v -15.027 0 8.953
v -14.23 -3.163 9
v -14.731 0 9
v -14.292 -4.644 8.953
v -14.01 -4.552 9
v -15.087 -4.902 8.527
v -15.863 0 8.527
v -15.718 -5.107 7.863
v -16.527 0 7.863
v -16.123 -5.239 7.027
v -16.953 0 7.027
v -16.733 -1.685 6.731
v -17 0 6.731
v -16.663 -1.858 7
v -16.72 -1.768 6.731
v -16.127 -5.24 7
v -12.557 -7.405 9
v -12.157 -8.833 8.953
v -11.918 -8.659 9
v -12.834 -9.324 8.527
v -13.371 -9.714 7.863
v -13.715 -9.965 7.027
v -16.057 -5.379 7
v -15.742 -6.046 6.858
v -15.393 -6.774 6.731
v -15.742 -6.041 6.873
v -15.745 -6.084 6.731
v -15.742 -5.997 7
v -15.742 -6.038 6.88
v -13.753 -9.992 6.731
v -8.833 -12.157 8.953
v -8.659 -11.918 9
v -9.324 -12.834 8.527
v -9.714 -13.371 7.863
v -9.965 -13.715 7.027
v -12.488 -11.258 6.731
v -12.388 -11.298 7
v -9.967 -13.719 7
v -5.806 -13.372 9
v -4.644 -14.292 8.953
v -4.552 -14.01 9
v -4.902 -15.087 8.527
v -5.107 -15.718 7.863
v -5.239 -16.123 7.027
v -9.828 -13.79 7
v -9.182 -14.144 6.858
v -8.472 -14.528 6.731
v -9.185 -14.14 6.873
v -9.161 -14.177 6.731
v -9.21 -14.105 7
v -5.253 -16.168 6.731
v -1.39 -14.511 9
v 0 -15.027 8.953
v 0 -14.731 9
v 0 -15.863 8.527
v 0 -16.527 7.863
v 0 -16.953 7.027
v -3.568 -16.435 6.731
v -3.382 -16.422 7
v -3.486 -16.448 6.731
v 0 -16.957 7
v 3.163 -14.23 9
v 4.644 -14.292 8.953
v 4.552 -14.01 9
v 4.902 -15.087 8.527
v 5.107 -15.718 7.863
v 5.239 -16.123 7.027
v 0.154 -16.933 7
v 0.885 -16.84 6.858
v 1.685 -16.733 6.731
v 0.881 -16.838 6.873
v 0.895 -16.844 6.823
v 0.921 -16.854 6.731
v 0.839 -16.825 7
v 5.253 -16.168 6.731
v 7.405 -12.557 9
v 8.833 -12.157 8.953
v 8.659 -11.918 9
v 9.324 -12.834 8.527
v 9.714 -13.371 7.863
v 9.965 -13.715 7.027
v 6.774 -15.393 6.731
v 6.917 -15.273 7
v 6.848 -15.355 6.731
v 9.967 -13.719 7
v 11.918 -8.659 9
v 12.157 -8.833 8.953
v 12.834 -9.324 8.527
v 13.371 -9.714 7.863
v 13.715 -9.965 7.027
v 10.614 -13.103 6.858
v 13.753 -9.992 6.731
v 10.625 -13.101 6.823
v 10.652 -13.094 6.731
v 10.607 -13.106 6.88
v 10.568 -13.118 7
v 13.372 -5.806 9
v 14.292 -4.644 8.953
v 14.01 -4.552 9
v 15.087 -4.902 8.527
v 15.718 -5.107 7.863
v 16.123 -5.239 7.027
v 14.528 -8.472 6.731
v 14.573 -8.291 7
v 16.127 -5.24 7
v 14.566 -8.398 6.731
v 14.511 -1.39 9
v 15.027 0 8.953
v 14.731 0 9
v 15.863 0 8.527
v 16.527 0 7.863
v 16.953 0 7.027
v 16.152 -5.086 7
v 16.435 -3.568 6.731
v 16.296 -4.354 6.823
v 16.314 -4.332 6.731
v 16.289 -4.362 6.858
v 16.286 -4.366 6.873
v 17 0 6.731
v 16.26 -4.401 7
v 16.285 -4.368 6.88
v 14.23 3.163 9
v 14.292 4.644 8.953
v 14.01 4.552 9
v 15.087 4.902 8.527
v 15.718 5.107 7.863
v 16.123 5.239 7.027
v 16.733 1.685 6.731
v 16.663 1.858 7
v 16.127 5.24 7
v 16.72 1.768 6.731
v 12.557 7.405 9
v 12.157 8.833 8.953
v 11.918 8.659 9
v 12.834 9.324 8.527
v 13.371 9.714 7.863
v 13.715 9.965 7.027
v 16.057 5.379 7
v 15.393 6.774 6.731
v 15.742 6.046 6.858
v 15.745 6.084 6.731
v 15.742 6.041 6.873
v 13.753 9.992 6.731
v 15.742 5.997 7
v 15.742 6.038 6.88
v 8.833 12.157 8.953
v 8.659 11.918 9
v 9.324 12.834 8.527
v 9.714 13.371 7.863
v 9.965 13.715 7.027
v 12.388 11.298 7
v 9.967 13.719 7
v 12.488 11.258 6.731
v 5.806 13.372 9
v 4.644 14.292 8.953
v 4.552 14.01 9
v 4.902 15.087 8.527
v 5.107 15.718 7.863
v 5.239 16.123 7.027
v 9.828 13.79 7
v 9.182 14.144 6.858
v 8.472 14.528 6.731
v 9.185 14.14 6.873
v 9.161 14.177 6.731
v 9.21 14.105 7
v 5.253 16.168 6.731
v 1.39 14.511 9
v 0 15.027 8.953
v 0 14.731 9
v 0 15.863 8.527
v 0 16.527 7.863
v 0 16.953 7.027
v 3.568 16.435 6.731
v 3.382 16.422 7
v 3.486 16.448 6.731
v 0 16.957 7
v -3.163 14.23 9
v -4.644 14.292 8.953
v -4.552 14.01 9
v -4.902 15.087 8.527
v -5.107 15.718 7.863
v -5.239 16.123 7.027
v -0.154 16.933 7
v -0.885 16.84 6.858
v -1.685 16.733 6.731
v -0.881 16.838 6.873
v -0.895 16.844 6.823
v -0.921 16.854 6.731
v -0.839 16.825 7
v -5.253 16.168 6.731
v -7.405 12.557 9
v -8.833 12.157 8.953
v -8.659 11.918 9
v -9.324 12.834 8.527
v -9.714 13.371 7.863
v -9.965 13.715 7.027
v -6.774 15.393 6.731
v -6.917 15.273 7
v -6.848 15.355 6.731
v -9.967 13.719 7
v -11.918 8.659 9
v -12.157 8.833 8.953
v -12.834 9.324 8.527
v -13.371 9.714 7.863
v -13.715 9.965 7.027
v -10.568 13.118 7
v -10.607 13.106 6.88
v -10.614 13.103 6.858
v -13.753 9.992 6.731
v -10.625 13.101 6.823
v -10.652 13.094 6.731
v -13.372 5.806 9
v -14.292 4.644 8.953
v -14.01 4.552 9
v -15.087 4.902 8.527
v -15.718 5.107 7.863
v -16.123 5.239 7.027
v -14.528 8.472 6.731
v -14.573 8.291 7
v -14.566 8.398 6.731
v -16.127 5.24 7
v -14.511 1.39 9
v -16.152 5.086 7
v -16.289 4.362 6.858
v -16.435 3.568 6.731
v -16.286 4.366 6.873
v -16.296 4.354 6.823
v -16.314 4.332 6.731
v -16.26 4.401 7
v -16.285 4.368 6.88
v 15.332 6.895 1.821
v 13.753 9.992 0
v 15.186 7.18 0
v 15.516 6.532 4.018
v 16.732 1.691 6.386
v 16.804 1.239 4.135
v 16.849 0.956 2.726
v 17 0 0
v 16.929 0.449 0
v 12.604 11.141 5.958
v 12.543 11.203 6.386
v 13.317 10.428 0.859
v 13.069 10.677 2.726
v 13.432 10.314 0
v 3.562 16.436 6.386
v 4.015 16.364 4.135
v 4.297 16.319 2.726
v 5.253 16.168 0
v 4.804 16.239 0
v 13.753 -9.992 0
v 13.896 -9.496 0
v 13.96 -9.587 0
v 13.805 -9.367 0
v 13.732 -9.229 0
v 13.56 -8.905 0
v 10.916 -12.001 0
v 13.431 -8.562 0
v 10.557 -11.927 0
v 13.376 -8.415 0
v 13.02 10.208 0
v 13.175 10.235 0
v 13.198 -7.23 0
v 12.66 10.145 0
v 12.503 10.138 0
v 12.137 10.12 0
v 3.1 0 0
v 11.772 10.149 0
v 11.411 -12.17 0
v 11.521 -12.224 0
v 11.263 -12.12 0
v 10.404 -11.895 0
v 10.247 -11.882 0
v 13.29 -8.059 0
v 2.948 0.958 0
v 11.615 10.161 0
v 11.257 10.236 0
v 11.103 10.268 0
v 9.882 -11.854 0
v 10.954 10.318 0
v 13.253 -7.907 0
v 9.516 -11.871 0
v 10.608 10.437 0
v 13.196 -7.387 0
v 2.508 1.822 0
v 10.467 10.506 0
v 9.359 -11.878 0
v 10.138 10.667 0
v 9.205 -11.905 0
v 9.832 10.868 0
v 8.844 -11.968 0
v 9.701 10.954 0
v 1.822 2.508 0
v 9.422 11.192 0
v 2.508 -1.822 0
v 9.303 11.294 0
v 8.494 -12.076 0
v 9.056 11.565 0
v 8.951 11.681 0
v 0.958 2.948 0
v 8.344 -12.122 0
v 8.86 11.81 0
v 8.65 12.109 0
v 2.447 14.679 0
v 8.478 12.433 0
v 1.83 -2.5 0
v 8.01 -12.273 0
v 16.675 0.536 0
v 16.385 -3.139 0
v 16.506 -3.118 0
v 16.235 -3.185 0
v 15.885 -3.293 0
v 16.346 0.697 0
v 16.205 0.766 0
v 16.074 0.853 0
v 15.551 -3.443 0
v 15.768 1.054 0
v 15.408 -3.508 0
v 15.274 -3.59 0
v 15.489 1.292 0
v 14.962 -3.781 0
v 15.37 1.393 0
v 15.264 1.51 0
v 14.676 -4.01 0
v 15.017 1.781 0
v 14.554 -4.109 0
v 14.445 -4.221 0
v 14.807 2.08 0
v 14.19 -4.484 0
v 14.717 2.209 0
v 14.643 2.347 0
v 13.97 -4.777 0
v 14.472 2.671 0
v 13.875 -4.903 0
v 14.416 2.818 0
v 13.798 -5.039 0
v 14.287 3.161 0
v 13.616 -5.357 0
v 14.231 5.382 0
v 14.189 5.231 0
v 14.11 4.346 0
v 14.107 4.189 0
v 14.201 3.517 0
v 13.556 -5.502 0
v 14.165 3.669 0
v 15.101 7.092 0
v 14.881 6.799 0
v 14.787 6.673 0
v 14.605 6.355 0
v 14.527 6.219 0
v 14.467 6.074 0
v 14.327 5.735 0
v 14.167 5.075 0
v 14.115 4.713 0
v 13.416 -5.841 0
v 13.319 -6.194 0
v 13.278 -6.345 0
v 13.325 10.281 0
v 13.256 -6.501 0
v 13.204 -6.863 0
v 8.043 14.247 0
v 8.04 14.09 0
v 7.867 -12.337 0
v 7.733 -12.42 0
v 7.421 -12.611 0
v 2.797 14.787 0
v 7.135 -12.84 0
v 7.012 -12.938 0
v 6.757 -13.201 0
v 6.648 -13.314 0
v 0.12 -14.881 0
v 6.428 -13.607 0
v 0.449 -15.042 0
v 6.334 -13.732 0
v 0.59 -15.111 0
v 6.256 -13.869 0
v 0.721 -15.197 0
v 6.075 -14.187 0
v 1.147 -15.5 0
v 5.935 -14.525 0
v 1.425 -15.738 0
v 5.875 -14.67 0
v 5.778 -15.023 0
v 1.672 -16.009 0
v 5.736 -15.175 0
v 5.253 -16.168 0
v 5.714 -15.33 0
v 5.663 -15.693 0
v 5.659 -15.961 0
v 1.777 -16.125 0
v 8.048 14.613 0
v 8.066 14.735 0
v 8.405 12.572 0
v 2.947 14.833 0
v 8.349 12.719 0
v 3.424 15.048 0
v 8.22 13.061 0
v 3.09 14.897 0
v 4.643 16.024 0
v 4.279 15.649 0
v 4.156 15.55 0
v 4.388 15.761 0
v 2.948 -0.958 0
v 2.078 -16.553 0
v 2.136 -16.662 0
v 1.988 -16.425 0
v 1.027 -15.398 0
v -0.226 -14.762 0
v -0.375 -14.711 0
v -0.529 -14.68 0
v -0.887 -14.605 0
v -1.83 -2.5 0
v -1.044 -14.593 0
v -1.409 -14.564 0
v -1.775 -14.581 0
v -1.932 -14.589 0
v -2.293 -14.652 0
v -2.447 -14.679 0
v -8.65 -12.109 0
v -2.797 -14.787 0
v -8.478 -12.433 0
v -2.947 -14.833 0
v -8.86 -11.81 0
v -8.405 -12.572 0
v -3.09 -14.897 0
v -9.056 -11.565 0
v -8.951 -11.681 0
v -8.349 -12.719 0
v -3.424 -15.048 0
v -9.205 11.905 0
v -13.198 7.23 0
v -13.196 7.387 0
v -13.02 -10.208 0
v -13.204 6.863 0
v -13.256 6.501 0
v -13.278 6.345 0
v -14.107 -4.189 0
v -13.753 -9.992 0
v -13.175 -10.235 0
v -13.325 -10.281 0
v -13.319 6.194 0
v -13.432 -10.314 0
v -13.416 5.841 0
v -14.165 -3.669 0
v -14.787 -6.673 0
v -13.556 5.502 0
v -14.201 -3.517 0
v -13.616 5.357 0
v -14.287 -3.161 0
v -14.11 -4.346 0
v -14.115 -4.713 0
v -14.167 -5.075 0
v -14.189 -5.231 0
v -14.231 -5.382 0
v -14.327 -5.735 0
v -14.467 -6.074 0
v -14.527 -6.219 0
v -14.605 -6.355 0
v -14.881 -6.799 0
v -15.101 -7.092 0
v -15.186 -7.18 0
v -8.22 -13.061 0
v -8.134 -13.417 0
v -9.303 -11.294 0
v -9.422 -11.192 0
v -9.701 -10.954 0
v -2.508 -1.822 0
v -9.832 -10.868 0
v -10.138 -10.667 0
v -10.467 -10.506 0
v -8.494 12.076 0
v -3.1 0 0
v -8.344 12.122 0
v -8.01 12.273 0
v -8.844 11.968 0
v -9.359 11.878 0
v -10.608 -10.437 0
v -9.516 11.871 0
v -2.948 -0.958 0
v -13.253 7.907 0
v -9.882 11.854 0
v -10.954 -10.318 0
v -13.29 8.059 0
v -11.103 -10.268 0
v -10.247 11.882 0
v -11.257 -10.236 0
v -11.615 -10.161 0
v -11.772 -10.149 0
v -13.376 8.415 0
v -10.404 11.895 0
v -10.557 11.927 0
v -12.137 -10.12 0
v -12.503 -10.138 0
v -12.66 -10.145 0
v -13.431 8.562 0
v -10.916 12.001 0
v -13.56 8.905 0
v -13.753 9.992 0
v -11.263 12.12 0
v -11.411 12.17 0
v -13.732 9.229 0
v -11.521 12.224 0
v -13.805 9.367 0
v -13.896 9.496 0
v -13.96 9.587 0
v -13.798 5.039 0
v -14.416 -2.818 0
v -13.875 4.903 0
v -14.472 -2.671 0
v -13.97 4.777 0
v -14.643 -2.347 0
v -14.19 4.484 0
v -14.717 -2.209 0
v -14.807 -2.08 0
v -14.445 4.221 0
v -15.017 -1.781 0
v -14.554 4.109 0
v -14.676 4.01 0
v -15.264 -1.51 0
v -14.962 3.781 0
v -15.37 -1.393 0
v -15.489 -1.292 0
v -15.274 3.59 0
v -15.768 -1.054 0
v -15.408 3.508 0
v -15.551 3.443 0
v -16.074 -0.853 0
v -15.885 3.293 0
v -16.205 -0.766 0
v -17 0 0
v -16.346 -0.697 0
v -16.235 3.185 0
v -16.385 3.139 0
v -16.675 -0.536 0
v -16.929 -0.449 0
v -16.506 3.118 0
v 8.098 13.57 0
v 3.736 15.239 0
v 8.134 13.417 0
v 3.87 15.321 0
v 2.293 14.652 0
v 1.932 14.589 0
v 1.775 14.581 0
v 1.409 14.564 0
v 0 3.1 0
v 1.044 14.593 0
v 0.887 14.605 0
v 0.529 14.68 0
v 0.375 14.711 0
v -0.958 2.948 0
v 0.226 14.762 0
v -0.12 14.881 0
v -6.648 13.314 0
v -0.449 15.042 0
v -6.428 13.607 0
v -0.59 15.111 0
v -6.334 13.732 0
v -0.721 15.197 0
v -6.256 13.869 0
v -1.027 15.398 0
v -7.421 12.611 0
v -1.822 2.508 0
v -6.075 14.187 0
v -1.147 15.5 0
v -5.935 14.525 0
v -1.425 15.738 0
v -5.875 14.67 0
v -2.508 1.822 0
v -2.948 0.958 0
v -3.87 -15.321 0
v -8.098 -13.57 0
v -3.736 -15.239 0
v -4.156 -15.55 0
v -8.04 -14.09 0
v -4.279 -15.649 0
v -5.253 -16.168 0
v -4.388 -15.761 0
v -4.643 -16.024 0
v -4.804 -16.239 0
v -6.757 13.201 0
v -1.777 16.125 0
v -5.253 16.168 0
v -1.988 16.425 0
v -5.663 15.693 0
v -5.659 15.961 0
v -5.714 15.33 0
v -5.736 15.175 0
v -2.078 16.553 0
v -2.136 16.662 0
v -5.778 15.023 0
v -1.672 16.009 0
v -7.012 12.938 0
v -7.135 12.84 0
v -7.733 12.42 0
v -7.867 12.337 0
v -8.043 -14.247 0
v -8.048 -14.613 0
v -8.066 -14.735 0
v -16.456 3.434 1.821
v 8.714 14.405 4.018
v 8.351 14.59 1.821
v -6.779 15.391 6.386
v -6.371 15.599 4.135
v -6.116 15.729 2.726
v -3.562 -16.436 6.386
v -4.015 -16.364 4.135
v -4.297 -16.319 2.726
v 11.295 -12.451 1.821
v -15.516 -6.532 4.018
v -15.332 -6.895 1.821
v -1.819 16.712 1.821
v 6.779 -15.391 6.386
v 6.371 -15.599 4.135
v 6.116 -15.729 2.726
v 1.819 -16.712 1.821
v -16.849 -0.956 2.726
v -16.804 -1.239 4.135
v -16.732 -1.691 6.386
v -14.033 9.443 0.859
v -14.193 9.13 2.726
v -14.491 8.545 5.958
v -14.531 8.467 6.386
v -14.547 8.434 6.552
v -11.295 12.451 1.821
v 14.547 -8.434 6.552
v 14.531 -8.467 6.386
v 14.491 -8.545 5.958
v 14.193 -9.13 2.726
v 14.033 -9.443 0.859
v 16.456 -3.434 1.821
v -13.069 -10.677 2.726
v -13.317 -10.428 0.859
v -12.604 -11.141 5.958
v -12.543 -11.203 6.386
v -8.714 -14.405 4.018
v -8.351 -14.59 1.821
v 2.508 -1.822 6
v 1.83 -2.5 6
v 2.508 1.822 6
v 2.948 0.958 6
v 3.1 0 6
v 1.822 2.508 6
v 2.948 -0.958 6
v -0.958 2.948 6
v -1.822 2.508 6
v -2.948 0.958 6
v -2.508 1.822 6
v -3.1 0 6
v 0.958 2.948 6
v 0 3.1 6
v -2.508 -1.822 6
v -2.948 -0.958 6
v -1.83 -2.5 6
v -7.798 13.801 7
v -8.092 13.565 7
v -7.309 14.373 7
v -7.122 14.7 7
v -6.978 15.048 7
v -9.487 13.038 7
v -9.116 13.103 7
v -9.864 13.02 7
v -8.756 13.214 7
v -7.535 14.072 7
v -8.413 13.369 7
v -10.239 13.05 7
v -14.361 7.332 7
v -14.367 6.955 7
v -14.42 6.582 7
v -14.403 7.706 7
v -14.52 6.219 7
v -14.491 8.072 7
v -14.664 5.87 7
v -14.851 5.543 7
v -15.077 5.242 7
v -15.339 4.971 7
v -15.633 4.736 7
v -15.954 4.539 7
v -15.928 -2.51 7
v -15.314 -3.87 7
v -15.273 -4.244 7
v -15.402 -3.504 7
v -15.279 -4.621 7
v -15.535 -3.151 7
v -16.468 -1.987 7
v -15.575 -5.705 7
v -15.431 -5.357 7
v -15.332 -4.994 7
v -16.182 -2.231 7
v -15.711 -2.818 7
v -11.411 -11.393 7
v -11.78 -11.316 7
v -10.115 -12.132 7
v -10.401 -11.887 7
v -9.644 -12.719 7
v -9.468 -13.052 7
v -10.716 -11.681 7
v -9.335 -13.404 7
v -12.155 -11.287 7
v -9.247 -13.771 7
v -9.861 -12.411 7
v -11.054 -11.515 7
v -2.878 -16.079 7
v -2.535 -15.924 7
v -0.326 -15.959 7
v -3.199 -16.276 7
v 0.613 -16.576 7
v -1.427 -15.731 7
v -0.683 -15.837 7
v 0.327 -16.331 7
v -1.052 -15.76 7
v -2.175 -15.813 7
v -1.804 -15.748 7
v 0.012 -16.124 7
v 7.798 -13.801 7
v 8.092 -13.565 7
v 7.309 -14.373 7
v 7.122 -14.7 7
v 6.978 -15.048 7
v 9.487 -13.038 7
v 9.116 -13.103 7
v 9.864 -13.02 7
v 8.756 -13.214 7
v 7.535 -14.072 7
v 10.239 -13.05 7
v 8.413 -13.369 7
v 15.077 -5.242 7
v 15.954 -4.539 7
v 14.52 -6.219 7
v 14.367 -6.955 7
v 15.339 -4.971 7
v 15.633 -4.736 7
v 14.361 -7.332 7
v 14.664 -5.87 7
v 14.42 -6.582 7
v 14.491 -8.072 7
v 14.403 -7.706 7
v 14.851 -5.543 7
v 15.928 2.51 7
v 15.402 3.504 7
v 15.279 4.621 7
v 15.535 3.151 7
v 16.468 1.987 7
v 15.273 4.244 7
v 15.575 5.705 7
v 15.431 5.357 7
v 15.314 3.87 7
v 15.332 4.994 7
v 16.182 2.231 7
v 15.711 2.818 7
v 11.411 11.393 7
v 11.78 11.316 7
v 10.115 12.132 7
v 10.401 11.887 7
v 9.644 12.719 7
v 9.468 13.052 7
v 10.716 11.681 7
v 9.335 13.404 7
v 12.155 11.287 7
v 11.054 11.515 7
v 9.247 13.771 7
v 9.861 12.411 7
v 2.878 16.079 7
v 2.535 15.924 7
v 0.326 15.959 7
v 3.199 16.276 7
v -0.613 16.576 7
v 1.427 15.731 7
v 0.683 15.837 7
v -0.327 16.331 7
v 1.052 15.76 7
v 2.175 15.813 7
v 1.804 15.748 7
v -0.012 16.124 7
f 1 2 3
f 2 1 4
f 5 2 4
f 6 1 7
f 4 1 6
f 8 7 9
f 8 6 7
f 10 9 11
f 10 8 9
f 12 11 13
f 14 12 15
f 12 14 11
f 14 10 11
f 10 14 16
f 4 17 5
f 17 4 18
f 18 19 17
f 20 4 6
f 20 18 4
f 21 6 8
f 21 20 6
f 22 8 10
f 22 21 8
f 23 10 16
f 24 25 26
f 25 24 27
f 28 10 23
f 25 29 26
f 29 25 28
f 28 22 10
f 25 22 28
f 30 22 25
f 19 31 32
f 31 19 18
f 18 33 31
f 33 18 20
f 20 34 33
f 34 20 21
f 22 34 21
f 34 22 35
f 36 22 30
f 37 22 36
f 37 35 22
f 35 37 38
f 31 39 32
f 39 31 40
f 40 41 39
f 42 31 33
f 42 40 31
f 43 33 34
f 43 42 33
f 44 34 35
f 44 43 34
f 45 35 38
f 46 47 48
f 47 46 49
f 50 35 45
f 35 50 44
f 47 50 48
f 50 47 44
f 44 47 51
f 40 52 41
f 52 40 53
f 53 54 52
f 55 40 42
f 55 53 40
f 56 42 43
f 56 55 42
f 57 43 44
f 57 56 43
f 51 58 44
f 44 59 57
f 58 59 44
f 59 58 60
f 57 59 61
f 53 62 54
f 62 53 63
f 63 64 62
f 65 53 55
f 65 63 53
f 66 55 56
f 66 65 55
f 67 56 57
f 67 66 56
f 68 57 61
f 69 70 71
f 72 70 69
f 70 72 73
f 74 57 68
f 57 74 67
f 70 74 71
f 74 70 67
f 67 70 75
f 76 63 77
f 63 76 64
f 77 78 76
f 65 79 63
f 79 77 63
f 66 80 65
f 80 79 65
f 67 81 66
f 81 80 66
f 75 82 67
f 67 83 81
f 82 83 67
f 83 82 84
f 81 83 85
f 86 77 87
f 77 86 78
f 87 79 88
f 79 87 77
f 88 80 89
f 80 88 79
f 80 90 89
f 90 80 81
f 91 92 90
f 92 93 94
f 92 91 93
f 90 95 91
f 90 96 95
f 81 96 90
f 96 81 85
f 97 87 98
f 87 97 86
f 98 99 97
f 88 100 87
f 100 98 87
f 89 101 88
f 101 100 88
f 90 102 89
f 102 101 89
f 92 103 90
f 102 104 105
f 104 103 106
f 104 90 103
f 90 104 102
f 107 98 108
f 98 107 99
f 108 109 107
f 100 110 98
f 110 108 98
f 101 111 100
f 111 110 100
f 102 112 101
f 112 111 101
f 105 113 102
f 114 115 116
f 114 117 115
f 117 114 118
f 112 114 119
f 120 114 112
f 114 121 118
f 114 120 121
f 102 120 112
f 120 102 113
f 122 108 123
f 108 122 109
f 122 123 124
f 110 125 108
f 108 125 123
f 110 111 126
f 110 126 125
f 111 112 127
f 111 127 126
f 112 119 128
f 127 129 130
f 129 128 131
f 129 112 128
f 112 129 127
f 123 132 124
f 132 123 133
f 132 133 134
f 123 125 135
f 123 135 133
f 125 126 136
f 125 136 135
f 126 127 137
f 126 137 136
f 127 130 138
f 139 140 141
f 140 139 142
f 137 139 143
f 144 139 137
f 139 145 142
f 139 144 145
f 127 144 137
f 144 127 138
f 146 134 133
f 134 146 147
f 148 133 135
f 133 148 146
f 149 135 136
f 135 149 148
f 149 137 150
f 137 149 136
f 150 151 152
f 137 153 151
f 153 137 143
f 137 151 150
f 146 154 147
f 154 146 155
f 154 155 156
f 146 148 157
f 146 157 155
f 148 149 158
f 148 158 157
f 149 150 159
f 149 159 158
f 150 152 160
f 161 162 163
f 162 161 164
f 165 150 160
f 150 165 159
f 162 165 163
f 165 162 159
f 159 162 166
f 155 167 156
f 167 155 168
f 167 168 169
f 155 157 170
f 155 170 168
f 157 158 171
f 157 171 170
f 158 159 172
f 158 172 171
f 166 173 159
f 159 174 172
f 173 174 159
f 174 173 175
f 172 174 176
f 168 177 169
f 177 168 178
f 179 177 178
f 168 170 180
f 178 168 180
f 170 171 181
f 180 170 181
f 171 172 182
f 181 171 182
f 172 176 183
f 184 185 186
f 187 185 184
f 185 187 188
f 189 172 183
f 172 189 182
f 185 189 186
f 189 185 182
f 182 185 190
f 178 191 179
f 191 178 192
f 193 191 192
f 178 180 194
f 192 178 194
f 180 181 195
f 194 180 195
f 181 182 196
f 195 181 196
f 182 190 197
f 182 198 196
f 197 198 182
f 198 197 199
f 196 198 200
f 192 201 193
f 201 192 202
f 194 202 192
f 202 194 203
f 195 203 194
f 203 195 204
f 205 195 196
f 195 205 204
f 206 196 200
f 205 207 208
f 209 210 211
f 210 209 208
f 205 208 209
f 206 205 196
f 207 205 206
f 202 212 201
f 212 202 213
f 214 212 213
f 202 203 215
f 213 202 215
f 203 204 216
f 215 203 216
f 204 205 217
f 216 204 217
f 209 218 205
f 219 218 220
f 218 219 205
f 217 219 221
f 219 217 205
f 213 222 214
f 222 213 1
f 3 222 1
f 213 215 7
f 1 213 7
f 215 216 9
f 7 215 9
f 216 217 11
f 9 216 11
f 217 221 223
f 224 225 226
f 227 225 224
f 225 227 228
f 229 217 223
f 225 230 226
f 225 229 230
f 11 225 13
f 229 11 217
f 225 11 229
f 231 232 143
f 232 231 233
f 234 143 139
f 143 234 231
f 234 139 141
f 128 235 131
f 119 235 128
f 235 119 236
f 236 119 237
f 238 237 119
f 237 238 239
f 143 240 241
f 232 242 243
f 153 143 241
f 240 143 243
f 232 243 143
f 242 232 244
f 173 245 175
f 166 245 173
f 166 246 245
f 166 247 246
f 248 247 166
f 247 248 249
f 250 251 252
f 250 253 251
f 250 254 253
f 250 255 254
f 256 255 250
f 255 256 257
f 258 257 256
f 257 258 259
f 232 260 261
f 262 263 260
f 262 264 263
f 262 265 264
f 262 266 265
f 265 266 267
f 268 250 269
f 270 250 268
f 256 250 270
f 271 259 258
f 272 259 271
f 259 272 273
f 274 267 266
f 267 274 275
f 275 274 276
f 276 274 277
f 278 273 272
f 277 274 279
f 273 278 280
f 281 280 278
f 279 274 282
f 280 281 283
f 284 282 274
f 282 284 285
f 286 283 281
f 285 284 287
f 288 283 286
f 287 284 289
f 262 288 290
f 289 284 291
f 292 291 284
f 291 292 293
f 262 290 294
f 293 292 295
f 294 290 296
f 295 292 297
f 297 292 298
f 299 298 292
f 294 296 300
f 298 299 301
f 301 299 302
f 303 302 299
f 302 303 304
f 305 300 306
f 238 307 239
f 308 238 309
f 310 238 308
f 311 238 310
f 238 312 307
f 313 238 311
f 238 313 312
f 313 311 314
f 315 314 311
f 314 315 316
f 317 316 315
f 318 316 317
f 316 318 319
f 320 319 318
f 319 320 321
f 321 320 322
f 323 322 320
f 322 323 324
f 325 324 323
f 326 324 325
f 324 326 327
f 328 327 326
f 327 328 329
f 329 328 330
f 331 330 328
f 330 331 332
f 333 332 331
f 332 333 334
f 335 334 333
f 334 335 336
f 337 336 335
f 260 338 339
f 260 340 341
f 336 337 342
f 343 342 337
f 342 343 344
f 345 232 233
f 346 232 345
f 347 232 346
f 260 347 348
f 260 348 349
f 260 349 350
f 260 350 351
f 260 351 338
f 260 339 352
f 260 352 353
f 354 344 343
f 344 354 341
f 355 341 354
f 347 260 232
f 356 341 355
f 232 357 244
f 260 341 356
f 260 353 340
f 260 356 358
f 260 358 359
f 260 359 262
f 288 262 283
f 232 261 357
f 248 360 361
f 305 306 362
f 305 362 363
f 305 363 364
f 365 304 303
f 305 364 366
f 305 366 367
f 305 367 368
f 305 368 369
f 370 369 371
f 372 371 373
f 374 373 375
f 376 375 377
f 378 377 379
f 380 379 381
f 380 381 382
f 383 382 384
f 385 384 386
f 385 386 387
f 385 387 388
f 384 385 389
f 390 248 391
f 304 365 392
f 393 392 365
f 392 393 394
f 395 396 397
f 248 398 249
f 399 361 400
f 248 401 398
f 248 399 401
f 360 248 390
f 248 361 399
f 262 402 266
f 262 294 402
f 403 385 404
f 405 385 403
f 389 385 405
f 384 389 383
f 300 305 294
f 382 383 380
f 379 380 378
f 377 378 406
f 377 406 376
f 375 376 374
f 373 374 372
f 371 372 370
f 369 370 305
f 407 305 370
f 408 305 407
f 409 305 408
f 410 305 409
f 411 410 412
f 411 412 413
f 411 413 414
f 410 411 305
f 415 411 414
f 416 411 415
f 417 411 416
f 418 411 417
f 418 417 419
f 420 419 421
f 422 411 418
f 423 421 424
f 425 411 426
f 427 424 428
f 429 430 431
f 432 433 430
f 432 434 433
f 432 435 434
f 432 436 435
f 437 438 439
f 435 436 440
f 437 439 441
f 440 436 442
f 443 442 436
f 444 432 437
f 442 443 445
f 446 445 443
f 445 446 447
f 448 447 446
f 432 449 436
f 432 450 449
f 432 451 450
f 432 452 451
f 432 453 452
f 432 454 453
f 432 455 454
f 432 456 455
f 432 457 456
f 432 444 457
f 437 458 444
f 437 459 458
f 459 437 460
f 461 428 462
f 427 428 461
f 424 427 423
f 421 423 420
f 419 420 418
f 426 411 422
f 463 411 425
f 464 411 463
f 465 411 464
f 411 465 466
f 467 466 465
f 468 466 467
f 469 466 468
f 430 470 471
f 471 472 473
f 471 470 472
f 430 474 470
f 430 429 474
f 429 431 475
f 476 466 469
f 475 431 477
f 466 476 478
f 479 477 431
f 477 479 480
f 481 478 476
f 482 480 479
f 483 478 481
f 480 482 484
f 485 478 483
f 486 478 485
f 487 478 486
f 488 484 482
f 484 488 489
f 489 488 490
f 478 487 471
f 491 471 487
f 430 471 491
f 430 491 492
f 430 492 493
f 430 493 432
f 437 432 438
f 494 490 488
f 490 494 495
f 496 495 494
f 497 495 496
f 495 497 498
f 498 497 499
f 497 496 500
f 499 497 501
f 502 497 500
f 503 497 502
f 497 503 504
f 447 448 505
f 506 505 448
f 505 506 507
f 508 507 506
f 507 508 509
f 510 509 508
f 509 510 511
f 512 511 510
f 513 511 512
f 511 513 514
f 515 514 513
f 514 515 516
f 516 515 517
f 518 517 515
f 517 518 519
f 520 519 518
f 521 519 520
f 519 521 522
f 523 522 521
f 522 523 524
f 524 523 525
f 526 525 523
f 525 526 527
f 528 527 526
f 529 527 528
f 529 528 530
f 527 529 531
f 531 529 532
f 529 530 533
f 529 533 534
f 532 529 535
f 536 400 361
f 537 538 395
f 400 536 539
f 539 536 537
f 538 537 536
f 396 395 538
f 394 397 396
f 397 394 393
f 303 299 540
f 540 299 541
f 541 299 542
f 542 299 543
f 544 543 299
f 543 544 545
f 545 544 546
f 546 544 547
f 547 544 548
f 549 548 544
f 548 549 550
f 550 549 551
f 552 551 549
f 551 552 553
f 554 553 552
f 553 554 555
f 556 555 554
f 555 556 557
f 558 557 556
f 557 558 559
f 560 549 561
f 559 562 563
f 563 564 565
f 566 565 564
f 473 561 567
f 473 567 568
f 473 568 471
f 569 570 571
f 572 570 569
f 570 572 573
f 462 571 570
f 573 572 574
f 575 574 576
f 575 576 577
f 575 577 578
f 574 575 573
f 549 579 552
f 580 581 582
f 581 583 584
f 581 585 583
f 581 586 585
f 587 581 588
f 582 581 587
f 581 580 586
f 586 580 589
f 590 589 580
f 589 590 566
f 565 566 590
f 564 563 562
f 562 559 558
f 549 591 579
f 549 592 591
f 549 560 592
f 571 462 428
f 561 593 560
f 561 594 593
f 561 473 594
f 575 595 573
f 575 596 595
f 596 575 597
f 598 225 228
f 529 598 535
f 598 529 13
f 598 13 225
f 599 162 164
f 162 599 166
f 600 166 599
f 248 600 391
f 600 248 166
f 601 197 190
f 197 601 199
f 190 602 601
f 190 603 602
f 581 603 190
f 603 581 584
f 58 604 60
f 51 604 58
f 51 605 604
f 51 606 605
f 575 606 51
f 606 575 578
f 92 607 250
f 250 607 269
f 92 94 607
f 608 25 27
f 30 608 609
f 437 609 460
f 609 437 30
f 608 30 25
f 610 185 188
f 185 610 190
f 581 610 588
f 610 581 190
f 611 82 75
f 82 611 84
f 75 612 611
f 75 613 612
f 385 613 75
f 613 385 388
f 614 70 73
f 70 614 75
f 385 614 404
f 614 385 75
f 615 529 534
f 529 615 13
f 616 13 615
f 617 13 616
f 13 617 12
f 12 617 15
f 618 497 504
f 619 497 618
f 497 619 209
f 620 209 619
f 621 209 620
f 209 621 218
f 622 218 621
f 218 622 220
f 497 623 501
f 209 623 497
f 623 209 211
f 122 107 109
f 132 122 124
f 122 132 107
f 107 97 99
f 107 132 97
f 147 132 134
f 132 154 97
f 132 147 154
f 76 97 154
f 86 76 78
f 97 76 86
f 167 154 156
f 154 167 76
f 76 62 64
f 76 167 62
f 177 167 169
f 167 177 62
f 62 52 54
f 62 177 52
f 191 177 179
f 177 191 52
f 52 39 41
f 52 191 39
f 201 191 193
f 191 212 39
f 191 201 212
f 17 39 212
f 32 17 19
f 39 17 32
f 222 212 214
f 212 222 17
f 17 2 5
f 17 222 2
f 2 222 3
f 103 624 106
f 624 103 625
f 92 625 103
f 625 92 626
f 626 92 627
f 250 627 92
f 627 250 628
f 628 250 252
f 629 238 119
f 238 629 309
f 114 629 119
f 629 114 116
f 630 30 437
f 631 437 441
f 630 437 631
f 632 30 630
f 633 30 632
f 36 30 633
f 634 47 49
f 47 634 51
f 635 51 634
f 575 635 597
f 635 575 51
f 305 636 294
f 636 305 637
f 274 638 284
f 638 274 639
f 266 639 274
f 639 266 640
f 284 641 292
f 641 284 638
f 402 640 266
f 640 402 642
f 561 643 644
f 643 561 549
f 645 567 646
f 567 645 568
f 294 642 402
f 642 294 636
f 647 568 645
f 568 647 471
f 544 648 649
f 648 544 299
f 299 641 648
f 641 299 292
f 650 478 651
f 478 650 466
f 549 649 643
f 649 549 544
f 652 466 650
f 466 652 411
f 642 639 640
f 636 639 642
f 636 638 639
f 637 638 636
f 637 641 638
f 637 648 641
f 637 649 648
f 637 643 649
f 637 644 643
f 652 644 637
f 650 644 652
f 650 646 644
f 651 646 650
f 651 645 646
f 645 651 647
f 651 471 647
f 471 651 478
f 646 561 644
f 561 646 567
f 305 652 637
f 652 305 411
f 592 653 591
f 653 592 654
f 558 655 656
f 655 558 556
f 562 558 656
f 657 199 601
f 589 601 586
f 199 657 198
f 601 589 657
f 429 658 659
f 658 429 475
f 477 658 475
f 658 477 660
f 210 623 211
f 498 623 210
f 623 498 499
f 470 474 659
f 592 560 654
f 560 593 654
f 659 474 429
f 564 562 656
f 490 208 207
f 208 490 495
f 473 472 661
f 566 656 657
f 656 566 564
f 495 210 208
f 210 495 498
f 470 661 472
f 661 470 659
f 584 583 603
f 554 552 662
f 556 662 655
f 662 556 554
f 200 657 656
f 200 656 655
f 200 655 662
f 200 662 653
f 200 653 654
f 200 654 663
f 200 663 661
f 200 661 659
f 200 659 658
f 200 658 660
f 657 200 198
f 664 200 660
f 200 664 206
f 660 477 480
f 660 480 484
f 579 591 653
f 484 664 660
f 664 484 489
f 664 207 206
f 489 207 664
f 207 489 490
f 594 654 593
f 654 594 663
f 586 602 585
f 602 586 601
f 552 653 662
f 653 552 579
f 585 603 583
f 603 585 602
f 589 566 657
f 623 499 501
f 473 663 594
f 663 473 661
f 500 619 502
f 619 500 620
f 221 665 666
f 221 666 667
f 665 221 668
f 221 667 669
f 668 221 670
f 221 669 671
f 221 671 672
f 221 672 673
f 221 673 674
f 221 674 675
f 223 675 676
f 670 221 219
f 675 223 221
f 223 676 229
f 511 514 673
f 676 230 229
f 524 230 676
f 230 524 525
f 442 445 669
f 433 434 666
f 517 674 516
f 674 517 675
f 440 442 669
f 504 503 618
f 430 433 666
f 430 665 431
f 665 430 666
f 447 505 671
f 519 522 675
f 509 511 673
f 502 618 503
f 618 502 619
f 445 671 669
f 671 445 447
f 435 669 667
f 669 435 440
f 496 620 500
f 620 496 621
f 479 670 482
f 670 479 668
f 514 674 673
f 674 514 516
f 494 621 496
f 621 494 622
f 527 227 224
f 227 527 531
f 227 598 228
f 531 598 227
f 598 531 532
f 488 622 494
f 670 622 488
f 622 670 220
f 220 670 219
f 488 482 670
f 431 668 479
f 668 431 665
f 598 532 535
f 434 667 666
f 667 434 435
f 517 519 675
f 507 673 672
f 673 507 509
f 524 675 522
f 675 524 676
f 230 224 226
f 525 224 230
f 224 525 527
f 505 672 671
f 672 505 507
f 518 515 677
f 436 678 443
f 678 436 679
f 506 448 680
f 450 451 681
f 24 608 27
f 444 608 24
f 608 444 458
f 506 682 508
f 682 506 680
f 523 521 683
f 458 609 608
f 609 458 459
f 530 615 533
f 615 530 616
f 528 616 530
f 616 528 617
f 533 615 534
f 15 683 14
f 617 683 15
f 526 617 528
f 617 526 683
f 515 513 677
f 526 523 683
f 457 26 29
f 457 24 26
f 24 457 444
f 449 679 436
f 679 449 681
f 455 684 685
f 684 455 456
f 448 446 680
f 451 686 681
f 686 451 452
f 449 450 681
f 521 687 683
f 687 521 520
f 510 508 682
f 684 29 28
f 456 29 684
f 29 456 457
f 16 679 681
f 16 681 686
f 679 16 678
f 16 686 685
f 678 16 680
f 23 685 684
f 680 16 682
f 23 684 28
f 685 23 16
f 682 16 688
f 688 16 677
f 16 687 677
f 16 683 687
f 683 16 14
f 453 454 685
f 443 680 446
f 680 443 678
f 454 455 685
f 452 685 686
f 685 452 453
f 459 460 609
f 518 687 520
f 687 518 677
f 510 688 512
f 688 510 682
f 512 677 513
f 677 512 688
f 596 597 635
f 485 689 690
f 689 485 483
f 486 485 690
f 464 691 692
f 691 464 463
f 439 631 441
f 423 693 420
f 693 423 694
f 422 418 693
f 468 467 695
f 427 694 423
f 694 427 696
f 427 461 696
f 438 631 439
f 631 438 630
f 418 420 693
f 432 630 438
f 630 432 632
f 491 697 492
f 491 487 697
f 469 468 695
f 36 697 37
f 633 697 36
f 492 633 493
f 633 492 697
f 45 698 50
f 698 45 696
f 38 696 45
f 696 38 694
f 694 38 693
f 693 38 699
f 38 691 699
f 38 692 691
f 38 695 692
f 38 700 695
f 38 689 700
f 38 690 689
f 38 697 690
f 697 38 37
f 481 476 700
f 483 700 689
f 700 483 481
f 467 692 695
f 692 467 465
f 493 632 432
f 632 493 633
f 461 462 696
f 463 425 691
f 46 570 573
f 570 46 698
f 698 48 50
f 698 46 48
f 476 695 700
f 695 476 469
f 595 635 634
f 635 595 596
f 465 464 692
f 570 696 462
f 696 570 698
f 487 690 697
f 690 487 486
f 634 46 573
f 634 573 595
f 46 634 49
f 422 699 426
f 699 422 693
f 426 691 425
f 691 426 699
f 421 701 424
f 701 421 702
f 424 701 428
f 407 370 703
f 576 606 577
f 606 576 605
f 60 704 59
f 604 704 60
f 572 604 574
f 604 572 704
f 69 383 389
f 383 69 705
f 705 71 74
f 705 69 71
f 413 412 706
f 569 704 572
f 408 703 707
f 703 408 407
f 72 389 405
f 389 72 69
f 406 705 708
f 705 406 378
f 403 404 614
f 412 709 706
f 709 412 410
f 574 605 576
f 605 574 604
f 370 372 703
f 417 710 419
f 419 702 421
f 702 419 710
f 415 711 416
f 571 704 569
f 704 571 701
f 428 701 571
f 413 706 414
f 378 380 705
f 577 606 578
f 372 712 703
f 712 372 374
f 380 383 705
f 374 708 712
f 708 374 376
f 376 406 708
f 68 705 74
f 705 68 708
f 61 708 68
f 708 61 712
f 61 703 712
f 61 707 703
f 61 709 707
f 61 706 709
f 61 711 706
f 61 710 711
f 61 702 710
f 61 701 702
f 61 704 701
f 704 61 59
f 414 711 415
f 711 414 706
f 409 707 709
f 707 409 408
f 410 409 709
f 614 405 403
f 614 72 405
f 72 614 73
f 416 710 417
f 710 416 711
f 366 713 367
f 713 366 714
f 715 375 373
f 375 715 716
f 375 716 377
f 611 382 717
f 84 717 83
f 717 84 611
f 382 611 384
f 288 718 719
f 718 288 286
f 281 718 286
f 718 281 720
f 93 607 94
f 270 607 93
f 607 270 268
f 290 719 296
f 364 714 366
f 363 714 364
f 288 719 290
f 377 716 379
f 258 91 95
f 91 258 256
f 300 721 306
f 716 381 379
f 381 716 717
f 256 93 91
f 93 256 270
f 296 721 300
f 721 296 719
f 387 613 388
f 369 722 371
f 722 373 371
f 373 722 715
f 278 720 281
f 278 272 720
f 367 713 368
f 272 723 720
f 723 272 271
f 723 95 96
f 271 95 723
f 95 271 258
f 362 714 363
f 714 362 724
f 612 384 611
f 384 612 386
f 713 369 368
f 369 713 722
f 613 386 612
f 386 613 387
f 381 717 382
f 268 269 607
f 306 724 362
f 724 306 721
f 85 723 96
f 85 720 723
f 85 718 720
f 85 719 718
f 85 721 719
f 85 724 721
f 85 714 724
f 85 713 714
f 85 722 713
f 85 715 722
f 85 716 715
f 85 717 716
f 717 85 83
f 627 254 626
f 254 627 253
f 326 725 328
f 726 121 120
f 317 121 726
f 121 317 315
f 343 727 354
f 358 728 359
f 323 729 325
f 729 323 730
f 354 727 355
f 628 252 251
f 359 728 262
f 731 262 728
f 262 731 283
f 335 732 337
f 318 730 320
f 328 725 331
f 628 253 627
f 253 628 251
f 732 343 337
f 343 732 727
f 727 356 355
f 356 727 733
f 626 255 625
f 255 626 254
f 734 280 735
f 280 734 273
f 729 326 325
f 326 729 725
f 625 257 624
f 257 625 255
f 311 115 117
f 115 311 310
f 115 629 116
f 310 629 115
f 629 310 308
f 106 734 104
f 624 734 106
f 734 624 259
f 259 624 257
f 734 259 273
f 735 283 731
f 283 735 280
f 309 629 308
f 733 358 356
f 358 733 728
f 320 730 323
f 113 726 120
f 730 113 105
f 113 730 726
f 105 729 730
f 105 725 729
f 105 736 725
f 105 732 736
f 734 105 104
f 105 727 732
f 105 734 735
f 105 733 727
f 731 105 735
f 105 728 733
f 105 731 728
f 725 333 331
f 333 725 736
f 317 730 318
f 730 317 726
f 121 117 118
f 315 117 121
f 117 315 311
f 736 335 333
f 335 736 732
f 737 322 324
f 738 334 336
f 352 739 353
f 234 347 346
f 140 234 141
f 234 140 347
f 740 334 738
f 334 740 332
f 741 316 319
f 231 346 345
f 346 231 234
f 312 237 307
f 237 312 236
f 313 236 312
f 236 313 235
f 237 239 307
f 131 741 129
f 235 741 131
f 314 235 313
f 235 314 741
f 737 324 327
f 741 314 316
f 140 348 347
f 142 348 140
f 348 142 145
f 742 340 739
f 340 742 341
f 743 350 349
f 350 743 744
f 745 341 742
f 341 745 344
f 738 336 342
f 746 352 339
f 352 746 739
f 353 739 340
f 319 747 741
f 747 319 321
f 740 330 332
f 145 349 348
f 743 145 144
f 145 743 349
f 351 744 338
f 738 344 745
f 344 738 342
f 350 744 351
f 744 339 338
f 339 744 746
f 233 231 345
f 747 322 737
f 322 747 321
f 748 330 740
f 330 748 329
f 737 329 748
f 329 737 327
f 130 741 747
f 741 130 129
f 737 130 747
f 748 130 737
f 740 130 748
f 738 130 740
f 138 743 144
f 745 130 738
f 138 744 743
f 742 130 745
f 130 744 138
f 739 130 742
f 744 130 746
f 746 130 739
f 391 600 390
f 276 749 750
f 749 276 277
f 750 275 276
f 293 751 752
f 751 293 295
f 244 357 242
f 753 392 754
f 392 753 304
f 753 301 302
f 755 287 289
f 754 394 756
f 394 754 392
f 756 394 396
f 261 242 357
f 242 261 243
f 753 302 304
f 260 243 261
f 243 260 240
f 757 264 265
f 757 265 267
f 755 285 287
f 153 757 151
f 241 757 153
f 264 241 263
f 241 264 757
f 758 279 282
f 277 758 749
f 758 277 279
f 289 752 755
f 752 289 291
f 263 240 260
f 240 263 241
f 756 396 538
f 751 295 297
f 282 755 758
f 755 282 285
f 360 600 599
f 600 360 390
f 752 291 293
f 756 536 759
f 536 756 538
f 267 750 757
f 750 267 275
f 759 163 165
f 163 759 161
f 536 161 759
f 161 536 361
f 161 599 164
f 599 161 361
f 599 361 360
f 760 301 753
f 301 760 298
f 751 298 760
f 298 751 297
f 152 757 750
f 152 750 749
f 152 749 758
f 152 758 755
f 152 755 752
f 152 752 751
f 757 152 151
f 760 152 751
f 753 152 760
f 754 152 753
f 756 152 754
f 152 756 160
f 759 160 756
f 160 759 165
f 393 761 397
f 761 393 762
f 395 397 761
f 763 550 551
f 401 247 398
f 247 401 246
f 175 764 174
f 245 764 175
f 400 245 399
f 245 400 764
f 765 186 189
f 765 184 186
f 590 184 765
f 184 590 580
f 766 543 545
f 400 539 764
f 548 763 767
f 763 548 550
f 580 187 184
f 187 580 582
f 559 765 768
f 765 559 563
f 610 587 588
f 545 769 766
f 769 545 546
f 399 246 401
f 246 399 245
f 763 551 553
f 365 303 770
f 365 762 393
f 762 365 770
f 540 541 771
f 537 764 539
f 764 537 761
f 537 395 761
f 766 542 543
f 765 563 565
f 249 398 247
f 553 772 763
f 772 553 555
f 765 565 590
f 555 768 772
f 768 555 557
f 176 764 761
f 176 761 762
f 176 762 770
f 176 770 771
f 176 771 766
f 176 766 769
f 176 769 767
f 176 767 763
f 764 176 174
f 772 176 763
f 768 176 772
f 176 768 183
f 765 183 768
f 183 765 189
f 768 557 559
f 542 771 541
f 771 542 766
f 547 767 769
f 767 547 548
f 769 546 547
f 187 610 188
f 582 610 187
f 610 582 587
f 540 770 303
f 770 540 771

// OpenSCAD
/*

Parametric Potentiometer Knob Generator
version 1.1
2012 Steve Cooley
http://sc-fa.com
http://beatseqr.com
http://hapticsynapses.com

parametric potentiometer knob generator by steve cooley is licensed under a Creative Commons Attribution-NonCommercial-ShareAlike 3.0 Unported License. Based on a work at sc-fa.com. Permissions beyond the scope of this license may be available at http://sc-fa.com/blog/contact.

view terms of the license here:
http://creativecommons.org/licenses/by-nc-sa/3.0/


version history
---------------
1.1 2012-04-12 fixed the arrow indicator code to be more robust and easier to adjust parameters for.
1.0 2012-03-?? initial release.


*/


//
//
// Physical attributes, basic
//
//

knob_radius_top = 17;
knob_radius_bottom = 17;
knob_height = 9;
knob_smoothness = 20;

shaft_radius = 3.1;
shaft_height = 7;
shaft_smoothness = 20;

shaft_is_flatted = true;
flat_size_adjustment = -0.0;
// you won't need to mess with this. less than 5 makes it disappear. you can, however,
// set the adjustment to be a negative decimal if you need a flat but not as big as the default. 
// go positive if you need a bigger flat
flat_size = 5 + flat_size_adjustment;

// some potentiometers need to have their knobs affixed with a set screw.
set_screw = false;
set_screw_radius = 1.5;
set_screw_depth = 9;
set_screw_height = 4;
quality_of_set_screw = 20;

//
// 
// Decorations
//
//

//
// top edge smoothing
// thanks to http://www.iheartrobotics.com/ for the articles!
//

smoothing = true;
smoothing_radius = 3;				// tweak on this one, how much smoothing to apply
smooth = 20;						// tweak on this one, Number of facets of rounding cylinder

ct = -0.1; 							// circle translate? not sure.
circle_radius = knob_radius_top;  	// just match the top edge radius
circle_height = 1; 					// actually.. I don't know what this does.
pad = 0.2;							// Padding to maintain manifold


//
// directional indicators
//

// this is a corner edge of a cube sticking out of the cylinder at the bottom
// you can use it instead of the arrow shaped cutout in the top if you like. Or both.

pointy_external_indicator = false;
pointy_external_indicator_height = 11;
pointy_external_indicator_pokey_outey_ness = -0.0; // 
pokey_outey_value = pointy_external_indicator_pokey_outey_ness - 1 - pad;
pokey_outey = [pokey_outey_value, pokey_outey_value,0];

// there's an arrow shaped hole you can have. There aren't a lot of controls for this.
// please feel free to improve on this script here.

arrow_indicator = false;
arrow_indicator_scale = 1.3;
arrow_indicator_translate = [0,1,16];
arrow_scale_head = 2;
arrow_scale_shaft = 1.5;

//
// indentations
//

// for spherical indentations, set the quantity, quality, size, and adjust the placement
indentations_sphere = false;
sphere_number_of_indentations = 12;
sphere_quality_of_indentations = 4;
size_of_sphere_indentations = 4;
// the first number in this set moves the spheres in or out. smaller is closer to the middle
// the second number in this set moves the spheres left or right
// the third number in this set moves the speheres up or down
translation_of_sphere_indentations = [10,0,15];
// in case you are using an odd number of indentations, you way want to adjust the starting angle
// so that they align to the front or set screw locations.
sphere_starting_rotation = 90;

// for cylinder indentations, set quantity, quality, radius, height, and placement
indentations_cylinder = true;
cylinder_number_of_indentations = 10;
cylinder_quality_of_indentations = 50;
radius_of_cylinder_indentations_top = 3;
radius_of_cylinder_indentations_bottom = 5;
height_of_cylinder_indentations = 12;
translation_of_cylinder_indentations = [0,8,-8];
cylinder_starting_rotation = -33.3;

// these are some setup variables... you probably won't need to mess with them.
negative_knob_radius = knob_radius_bottom*-1;


// this is the main module. It calls the submodules.
make_the_knob();

module make_the_knob()
{
	difference()
		{
		difference()
			{
		
			difference() 
				{
				difference() 
					{
					
					union()
						{
						
						difference()
							{
							// main cylinder
							cylinder(r1=knob_radius_bottom,r2=knob_radius_top,h=knob_height, $fn=knob_smoothness);
							
							smoothing();				
		
							}
				
						external_direction_indicator();	
						}
					
					shaft_hole();
					}
					
				set_screw_hole();
				}
			
			arrow_indicator();
			indentations();
		}
	}

}

module smoothing() {

// smoothing the top
				if(smoothing == true)
					{		
						translate([0,0,knob_height])
						rotate([180,0,0])
						difference() {
							rotate_extrude(convexity=10,  $fn = smooth)
							translate([circle_radius-ct-smoothing_radius+pad,ct-pad,0])
							square(smoothing_radius+pad,smoothing_radius+pad);
	
							rotate_extrude(convexity=10,  $fn = smooth)
							translate([circle_radius-ct-smoothing_radius,ct+smoothing_radius,0])
							circle(r=smoothing_radius,$fn=smooth);
							}	
					}
}

module external_direction_indicator() {

				if(pointy_external_indicator == true)
						{
						
						
						// outer pointy indicator
						rotate([0,0,45])
						translate(pokey_outey)
						// cube size of 8 minimum to point out
						cube(size=[knob_radius_bottom,knob_radius_bottom,pointy_external_indicator_height],center=false);
						}

}

module shaft_hole() {
				// shaft hole
				difference()
					{
					
					// round shaft hole
					translate([ 0, 0, -1 ]) 
					cylinder(r=shaft_radius,h=shaft_height, $fn=shaft_smoothness);
					
					if(shaft_is_flatted == true)
						{
						// D shaft shape for shaft cutout
						rotate( [0,0,90]) 
						translate([-7.5,-5,0]) 
						cube(size=[flat_size,10,13],center=false);
						}
					}
}


module set_screw_hole() {

			if(set_screw == true)
				{
				// set screw hole
				rotate ([90,0,0])
				translate([ 0, set_screw_height, 1 ])
				cylinder(r=set_screw_radius,h=set_screw_depth, $fn=quality_of_set_screw);
				}
}

module arrow_indicator() {
		if(arrow_indicator == true)
			{
			translate(arrow_indicator_translate)
			// begin arrow top cutout
			// translate([(knob_radius/2),knob_height,knob_height])
			rotate([90,0,45])
			scale([arrow_indicator_scale*.3,arrow_indicator_scale*.3,arrow_indicator_scale*.3])
			union()
				{			  
				rotate([90,45,0])
				scale([arrow_scale_head,arrow_scale_head,1])
				cylinder(r=8, h=10, $fn=3, center=true);
				rotate([90,45,0])
				translate([-10,0,0])
				scale([arrow_scale_shaft,arrow_scale_shaft,1])
				cube(size=[15,10,10],center=true);
				}
			}
}

module indentations() {

if(indentations_sphere == true)
			{
			for (z = [0:sphere_number_of_indentations]) 
				{
				rotate([0,0,sphere_starting_rotation+((360/sphere_number_of_indentations)*z)])
				translate(translation_of_sphere_indentations)
				sphere(size_of_sphere_indentations, $fn=sphere_quality_of_indentations); 
				}
			}
if(indentations_cylinder == true)
			{
			for (z = [0:cylinder_number_of_indentations]) 
				{
				rotate([0,0,cylinder_starting_rotation+((360/cylinder_number_of_indentations)*z)])
				
				translate([negative_knob_radius,0,knob_height])
				translate(translation_of_cylinder_indentations)
				cylinder(r1=radius_of_cylinder_indentations_bottom, r2=radius_of_cylinder_indentations_top, h=height_of_cylinder_indentations, center=true, $fn=cylinder_quality_of_indentations); 
				}
			}
		}
